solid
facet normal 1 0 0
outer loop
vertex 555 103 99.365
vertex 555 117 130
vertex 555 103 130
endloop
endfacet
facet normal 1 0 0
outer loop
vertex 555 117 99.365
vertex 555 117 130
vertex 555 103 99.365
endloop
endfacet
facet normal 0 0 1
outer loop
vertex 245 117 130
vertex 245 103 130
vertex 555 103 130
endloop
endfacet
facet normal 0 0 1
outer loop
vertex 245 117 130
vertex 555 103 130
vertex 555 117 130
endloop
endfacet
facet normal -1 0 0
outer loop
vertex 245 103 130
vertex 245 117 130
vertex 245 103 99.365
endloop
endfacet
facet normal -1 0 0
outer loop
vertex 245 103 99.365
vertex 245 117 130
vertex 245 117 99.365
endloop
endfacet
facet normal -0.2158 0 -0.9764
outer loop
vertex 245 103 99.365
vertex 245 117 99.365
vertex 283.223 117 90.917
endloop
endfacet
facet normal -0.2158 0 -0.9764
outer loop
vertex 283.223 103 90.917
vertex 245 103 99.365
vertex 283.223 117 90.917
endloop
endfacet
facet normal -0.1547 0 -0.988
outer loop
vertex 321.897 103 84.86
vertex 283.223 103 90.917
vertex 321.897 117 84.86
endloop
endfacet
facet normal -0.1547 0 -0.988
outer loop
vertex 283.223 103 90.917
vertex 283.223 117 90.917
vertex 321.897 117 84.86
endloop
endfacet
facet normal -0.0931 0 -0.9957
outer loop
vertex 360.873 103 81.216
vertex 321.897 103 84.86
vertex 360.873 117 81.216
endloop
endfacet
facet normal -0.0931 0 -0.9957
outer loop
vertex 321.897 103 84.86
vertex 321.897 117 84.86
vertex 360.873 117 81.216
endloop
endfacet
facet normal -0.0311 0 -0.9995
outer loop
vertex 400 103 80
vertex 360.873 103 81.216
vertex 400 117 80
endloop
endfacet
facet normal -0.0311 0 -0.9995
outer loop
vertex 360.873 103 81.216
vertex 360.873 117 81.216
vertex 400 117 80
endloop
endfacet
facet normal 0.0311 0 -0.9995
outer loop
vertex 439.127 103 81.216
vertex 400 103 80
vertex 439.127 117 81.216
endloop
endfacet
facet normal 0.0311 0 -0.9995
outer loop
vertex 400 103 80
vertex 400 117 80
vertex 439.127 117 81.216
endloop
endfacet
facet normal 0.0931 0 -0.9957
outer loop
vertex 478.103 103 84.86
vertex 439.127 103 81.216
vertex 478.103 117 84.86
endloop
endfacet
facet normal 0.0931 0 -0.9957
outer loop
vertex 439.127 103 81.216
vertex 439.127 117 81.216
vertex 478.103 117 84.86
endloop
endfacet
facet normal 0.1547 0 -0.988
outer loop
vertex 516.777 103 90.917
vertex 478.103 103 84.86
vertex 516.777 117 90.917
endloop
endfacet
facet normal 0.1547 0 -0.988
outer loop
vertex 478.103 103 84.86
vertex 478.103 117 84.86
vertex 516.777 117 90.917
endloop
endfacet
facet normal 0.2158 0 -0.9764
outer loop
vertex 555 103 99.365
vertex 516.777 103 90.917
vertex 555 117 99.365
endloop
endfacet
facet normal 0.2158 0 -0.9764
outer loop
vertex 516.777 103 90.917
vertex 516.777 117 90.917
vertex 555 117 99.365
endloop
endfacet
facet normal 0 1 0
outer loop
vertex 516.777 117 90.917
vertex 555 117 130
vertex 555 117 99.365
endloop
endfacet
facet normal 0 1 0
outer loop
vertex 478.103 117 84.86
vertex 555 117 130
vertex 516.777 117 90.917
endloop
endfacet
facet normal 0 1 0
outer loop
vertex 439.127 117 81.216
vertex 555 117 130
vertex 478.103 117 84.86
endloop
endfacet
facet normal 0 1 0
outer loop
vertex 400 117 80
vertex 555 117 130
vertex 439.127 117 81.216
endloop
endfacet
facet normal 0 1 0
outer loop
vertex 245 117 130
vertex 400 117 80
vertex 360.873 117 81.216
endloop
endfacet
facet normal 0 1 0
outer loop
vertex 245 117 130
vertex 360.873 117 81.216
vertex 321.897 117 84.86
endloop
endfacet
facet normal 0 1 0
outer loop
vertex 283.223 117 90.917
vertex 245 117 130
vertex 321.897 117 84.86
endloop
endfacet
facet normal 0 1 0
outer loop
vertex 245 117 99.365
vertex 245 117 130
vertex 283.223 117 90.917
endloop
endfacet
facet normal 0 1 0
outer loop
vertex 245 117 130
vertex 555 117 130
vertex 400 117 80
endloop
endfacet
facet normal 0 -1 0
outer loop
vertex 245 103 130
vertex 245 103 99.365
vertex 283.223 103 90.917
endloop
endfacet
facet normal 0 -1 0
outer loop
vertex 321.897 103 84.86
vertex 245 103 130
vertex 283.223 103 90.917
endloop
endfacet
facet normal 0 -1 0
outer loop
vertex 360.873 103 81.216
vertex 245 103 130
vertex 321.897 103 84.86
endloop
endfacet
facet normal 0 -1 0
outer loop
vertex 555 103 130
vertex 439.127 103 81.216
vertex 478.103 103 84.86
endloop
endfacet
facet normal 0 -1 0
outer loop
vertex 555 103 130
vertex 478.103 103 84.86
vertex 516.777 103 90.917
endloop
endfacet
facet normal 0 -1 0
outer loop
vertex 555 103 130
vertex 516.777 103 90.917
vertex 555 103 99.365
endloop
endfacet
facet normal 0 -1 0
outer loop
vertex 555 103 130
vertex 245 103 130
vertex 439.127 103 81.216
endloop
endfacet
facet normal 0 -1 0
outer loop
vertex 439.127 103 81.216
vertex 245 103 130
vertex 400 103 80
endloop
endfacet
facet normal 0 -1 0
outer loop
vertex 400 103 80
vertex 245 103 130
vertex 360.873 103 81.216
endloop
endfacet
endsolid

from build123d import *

# Parameters (mm, degrees)
CYLINDER002_R          = 630
CYLINDER002_DEPTH      = 15
CYLINDER002_ROLL_ANGLE = 90
BOX025_W               = 50
BOX025_H               = 15
BOX025_DEPTH           = 310
BOX025_PITCH_ANGLE     = 90


with BuildPart() as rundung_antriebskulisse:
    # Cylinder002 → Cylinder002 (new body)
    with BuildSketch(Plane.XY):
        Circle(CYLINDER002_R)
    extrude(amount=CYLINDER002_DEPTH)


with BuildPart() as rundung_antriebskulisse_1:
    # Cylinder002 roll: moved
    add(rundung_antriebskulisse.part.rotate(Axis((0, 0, 0), (1, 0, 0)), CYLINDER002_ROLL_ANGLE))


with BuildPart() as rundung_antriebskulisse_2:
    # Cylinder002 placement: moved
    add(rundung_antriebskulisse_1.part.moved(Location((400, 118, 710))))


with BuildPart() as antriebskulisse:
    # Box025 → Box025 (new body)
    with BuildSketch(Plane.XY):
        with Locations((25, 7.5)):
            Rectangle(BOX025_W, BOX025_H)
    extrude(amount=BOX025_DEPTH)


with BuildPart() as antriebskulisse_1:
    # Box025 pitch: moved
    add(antriebskulisse.part.rotate(Axis((0, 0, 0), (0, 1, 0)), BOX025_PITCH_ANGLE))


with BuildPart() as antriebskulisse_2:
    # Box025 placement: moved
    add(antriebskulisse_1.part.moved(Location((245, 102, 130))))

    # Common: intersect Rundung_Antriebskulisse
    add(rundung_antriebskulisse_2.part, mode=Mode.INTERSECT)


solid = antriebskulisse_2.part
